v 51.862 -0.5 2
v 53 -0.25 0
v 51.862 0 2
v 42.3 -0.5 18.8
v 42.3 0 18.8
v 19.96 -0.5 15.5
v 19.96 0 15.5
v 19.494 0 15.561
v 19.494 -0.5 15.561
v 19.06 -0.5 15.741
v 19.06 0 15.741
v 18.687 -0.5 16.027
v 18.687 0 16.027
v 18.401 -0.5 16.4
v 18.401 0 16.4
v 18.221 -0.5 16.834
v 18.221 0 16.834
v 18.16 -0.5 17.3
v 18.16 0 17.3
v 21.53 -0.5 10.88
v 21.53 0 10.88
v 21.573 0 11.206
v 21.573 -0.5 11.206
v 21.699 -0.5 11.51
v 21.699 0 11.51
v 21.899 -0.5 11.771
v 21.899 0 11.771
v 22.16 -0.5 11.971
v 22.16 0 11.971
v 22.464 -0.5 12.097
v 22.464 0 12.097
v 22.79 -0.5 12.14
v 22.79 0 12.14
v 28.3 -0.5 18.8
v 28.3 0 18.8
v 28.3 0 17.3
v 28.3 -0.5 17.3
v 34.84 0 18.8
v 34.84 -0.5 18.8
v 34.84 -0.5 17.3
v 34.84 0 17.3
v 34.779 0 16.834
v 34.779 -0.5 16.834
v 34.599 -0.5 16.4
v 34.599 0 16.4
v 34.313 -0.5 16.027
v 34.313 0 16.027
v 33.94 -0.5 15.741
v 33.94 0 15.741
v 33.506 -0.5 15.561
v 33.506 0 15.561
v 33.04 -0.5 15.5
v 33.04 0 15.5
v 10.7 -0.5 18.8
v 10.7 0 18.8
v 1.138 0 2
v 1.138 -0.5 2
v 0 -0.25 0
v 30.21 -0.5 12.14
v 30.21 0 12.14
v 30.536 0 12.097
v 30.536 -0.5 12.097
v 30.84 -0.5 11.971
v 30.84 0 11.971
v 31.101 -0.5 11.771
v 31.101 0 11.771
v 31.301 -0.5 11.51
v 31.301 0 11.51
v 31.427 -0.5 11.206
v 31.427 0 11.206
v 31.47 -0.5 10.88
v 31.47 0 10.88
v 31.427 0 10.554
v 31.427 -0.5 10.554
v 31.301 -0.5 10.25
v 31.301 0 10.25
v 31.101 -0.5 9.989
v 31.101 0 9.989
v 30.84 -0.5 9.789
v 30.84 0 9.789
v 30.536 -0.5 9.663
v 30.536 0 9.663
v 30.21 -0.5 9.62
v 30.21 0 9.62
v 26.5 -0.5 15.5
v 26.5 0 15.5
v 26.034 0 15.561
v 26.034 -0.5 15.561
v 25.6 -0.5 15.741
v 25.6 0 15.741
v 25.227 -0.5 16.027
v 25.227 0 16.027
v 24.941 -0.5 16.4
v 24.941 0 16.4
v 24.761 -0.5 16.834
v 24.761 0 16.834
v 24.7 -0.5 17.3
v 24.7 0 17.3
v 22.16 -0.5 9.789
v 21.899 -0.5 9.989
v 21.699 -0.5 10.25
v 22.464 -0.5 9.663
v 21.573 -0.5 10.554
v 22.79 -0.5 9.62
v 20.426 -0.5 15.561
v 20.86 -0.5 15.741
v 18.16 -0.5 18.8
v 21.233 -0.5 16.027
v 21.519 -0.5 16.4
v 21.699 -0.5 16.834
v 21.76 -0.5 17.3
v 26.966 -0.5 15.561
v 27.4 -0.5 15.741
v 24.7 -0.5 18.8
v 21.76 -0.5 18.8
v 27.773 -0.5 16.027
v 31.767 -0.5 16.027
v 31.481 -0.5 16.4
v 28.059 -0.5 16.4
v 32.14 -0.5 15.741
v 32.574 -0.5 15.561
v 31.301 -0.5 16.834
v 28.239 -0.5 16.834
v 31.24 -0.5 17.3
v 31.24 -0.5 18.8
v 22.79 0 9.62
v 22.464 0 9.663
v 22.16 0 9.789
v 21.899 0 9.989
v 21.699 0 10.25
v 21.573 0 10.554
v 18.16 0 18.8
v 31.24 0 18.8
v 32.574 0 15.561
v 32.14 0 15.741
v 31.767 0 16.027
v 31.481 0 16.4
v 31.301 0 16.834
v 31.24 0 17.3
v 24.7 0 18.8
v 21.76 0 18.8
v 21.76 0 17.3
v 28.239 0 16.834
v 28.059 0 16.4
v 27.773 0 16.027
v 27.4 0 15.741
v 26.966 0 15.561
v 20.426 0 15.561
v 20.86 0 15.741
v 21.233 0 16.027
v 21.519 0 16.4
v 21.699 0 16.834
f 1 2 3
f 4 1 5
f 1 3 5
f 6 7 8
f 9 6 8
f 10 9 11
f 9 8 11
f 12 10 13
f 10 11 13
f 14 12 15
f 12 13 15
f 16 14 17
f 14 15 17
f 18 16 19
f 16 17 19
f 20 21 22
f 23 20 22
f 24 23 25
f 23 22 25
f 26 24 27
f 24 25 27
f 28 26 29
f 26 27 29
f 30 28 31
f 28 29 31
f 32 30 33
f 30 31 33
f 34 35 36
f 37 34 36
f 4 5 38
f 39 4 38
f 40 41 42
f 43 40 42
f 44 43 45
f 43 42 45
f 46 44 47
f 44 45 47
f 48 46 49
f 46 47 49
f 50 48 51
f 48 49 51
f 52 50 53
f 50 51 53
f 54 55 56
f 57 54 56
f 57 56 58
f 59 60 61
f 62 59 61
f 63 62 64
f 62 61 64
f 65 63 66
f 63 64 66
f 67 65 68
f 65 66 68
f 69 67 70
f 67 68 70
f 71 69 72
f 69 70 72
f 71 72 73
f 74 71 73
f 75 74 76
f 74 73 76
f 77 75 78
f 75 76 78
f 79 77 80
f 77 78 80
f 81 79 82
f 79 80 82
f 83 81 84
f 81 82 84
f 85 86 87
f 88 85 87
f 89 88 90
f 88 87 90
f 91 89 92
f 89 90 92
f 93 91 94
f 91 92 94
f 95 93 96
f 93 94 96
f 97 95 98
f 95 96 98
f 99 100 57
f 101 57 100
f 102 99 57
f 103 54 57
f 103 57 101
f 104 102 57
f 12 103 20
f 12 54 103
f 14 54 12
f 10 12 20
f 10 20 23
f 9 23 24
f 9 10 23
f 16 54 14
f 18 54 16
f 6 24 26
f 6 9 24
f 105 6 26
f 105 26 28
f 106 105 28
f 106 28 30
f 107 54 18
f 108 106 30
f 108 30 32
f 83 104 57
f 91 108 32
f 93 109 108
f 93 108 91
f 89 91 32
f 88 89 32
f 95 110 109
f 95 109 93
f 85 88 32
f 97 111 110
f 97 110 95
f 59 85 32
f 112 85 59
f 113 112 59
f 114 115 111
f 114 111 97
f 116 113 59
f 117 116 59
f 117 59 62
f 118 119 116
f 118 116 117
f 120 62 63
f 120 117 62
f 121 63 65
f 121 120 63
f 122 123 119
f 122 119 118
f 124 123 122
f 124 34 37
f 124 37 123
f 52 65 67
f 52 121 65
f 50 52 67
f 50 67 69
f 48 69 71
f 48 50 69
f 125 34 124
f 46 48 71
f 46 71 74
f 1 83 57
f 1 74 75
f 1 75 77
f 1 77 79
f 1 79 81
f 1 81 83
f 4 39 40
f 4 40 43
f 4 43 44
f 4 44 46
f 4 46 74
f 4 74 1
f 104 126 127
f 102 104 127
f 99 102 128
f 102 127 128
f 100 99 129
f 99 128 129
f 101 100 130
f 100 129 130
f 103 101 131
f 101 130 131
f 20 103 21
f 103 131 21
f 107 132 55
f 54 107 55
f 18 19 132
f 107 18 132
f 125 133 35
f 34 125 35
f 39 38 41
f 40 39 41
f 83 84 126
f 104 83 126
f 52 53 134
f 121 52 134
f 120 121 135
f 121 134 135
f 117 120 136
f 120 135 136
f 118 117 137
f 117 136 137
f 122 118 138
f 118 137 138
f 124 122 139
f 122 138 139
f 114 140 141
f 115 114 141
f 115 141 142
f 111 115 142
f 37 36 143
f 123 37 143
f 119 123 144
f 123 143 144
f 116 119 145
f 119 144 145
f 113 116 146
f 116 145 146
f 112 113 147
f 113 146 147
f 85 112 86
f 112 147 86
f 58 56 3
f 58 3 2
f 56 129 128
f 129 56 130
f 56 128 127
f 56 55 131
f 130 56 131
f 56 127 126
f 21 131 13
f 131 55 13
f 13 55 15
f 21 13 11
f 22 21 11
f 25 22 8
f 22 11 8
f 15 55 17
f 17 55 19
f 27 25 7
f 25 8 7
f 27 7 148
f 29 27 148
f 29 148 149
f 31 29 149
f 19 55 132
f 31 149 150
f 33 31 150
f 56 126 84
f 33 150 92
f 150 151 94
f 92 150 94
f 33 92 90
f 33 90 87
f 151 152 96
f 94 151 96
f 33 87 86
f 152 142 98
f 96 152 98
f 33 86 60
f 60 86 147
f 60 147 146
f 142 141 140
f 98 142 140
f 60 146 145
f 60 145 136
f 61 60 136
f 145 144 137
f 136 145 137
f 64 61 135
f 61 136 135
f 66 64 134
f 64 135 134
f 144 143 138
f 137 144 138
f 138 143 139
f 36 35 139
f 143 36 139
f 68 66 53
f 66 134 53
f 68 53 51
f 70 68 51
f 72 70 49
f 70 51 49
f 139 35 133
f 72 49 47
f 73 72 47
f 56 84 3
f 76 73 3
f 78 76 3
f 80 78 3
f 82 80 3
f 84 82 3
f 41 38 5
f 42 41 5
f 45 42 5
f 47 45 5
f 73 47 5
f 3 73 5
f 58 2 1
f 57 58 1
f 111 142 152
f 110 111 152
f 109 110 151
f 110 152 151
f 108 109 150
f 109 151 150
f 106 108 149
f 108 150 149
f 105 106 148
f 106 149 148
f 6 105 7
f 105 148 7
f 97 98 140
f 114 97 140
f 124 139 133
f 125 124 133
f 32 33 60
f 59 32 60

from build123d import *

# Parameters (mm, degrees)
F1_DEPTH = 0.5
F4_DEPTH = 53.001


with BuildPart() as f1:
    # F0 (on Front) → F1 (new body)
    with BuildSketch(Plane.XZ):
        with BuildLine():
            Line((10.7, 18.8), (0, 0))
            Line((0, 0), (53, 0))
            Line((53, 0), (42.3, 18.8))
            Line((42.3, 18.8), (34.84, 18.8))
            Line((34.84, 18.8), (34.84, 17.3))
            ThreePointArc((34.84, 17.3), (34.312792, 16.027208), (33.04, 15.5))
            ThreePointArc((33.04, 15.5), (31.767208, 16.027208), (31.24, 17.3))
            Line((31.24, 17.3), (31.24, 18.8))
            Line((31.24, 18.8), (28.3, 18.8))
            Line((28.3, 18.8), (28.3, 17.3))
            ThreePointArc((28.3, 17.3), (27.772792, 16.027208), (26.5, 15.5))
            ThreePointArc((26.5, 15.5), (25.227208, 16.027208), (24.7, 17.3))
            Line((24.7, 17.3), (24.7, 18.8))
            Line((24.7, 18.8), (21.76, 18.8))
            Line((21.76, 18.8), (21.76, 17.3))
            ThreePointArc((21.76, 17.3), (21.232792, 16.027208), (19.96, 15.5))
            ThreePointArc((19.96, 15.5), (18.687208, 16.027208), (18.16, 17.3))
            Line((18.16, 17.3), (18.16, 18.8))
            Line((18.16, 18.8), (10.7, 18.8))
        make_face()
        with BuildLine():
            ThreePointArc((21.53, 10.88), (21.899045, 11.770955), (22.79, 12.14))
            Line((22.79, 12.14), (30.21, 12.14))
            ThreePointArc((30.21, 12.14), (31.100955, 11.770955), (31.47, 10.88))
            ThreePointArc((31.47, 10.88), (31.100955, 9.989045), (30.21, 9.62))
            Line((30.21, 9.62), (22.79, 9.62))
            ThreePointArc((22.79, 9.62), (21.899045, 9.989045), (21.53, 10.88))
        make_face(mode=Mode.SUBTRACT)
    extrude(amount=F1_DEPTH)

    # F3 (on Right) → F4 (cut, through all)
    with BuildSketch(Plane.YZ):
        Polygon((0, 2), (-0.25, 0), (0, 0), align=None)
        Polygon((-0.5, 2), (-0.5, 0), (-0.25, 0), align=None)
    extrude(amount=F4_DEPTH, mode=Mode.SUBTRACT)


solid = f1.part
